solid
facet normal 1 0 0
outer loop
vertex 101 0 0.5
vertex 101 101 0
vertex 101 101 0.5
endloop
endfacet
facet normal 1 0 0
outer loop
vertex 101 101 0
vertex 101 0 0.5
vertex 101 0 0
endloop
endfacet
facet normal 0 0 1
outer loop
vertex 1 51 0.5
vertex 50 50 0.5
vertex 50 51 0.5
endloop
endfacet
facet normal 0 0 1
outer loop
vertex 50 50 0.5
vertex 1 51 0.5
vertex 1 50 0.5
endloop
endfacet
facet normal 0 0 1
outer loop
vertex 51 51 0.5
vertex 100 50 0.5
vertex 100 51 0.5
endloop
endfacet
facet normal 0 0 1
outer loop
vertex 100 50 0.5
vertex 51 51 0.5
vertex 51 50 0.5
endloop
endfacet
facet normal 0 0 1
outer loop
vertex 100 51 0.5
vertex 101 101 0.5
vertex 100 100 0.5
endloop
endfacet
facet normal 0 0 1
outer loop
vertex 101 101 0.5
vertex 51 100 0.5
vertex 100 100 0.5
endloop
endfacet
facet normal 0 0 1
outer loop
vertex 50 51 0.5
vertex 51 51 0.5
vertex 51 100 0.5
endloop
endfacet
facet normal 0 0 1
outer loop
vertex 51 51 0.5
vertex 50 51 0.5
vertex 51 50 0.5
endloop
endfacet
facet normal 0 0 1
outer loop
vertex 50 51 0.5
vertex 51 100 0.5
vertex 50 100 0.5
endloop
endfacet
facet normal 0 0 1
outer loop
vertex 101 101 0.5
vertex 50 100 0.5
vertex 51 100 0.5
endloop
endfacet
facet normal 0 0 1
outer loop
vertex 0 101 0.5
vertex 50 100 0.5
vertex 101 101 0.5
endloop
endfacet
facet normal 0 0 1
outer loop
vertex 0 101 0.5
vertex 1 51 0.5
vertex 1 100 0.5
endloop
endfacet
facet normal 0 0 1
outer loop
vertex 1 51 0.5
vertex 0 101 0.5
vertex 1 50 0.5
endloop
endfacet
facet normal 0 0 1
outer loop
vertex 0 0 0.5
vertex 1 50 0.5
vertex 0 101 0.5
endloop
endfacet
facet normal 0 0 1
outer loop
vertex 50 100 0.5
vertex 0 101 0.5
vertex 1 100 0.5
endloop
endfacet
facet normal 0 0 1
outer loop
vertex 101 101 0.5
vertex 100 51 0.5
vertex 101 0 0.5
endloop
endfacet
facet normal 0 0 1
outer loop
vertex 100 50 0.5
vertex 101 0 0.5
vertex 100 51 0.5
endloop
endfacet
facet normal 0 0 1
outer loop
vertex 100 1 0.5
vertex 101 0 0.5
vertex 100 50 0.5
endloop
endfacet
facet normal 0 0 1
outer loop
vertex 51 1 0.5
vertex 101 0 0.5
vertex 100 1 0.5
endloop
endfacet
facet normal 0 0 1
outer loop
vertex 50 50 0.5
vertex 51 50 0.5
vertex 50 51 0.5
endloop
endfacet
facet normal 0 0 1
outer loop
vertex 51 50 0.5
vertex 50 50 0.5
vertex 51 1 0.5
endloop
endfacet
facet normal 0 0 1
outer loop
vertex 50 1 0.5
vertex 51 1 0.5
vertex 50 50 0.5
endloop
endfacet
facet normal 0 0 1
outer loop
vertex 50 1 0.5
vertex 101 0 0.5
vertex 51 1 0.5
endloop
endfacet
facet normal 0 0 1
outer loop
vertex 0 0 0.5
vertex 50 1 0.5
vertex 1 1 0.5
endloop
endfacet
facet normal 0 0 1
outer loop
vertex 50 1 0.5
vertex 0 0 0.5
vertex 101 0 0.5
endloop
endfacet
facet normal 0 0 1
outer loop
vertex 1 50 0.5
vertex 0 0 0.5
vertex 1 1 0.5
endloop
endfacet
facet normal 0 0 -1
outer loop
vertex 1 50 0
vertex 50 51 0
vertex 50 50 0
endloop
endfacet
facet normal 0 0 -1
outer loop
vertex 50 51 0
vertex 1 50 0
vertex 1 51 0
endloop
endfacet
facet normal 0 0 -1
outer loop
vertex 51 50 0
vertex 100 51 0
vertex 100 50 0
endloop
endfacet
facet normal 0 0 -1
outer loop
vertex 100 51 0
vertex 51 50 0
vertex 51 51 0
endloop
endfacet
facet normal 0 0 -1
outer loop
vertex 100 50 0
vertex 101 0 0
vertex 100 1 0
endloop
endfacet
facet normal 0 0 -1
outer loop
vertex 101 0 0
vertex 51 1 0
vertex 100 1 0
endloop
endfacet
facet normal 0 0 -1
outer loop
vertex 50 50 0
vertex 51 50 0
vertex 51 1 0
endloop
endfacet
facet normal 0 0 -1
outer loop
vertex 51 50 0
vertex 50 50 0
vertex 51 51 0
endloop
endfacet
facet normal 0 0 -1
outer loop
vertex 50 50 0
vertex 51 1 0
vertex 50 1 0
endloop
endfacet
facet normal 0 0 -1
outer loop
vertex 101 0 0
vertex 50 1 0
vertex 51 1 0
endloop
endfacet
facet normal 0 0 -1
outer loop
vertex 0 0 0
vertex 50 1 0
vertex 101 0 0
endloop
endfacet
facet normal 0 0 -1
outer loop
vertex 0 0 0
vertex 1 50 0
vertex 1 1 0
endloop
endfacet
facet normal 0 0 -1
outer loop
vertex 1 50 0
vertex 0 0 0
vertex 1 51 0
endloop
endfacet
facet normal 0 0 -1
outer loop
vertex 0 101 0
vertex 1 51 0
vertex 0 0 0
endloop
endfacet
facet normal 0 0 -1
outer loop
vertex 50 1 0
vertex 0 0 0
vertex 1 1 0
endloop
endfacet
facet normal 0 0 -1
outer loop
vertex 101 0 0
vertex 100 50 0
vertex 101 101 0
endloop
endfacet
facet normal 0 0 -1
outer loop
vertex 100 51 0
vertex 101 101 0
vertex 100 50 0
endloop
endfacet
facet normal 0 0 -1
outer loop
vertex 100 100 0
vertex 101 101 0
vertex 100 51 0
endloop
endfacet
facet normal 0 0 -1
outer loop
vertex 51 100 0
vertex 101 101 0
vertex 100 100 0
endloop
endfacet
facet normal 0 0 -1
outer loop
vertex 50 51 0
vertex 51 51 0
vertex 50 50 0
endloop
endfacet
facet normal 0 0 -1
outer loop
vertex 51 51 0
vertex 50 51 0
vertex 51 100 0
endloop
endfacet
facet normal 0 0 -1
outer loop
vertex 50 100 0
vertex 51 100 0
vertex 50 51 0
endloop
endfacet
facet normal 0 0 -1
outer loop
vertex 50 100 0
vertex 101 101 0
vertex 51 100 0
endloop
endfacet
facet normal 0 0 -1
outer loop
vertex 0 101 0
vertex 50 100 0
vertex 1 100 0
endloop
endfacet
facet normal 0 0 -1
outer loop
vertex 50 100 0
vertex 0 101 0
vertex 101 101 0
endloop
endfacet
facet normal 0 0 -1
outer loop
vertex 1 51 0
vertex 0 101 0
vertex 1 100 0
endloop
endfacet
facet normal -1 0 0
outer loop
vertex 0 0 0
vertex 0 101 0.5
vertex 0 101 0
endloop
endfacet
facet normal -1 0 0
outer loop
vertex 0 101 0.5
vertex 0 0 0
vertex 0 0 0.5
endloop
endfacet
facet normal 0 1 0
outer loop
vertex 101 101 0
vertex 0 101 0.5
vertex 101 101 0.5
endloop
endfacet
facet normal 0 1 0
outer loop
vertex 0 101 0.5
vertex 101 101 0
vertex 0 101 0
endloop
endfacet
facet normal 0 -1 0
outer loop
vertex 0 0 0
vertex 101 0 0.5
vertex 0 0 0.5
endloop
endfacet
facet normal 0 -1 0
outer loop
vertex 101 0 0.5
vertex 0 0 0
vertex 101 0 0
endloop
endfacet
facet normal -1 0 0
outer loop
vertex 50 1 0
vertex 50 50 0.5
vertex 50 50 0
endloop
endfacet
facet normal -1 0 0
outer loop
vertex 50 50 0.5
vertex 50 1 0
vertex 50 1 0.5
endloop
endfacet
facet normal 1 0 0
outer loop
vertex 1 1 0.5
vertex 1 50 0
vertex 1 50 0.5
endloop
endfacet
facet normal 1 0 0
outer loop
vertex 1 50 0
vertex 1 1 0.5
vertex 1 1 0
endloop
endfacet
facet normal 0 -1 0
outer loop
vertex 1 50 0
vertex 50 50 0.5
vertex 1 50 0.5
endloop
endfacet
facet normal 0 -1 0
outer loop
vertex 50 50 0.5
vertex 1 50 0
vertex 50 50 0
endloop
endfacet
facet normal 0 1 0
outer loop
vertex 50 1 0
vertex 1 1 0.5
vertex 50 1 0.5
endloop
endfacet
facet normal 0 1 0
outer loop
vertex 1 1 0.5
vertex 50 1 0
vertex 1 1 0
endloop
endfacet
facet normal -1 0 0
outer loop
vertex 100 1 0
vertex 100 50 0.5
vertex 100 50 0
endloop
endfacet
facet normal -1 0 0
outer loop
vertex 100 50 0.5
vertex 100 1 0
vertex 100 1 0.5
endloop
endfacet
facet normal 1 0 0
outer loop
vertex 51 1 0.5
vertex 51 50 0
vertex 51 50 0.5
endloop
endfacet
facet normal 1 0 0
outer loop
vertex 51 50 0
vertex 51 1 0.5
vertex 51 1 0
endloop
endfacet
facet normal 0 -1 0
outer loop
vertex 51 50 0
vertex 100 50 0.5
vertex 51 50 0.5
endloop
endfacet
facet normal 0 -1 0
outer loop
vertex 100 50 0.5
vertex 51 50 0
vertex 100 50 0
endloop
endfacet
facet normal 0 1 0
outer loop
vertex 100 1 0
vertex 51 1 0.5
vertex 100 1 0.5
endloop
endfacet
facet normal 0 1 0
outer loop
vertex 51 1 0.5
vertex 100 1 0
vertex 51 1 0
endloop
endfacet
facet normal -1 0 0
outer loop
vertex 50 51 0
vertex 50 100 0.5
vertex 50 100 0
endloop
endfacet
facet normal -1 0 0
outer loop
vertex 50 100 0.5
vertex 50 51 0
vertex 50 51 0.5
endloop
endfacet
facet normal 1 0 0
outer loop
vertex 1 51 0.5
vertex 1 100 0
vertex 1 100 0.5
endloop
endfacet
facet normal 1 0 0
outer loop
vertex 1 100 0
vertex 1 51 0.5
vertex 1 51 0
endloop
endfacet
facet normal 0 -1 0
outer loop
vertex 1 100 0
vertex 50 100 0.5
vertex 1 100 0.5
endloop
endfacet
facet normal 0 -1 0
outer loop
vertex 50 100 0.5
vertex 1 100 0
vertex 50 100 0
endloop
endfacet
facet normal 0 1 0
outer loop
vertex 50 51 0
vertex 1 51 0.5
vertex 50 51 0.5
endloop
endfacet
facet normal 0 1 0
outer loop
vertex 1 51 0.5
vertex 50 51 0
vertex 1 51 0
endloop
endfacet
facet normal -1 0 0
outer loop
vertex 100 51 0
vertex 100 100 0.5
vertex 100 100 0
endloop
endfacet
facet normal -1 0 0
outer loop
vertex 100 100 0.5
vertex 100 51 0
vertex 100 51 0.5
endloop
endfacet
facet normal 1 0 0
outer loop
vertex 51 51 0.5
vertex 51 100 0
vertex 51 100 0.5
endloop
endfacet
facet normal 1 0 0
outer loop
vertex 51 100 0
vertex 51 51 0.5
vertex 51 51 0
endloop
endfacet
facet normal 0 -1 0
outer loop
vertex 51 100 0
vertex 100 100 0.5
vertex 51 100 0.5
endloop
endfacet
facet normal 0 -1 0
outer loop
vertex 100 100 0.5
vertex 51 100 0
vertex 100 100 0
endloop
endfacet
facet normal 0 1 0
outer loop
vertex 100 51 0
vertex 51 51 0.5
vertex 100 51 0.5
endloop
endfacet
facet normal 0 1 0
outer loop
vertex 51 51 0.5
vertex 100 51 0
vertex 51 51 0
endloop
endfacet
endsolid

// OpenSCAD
s = 100;
w = 1;
h = 0.5;

inside_dims = [s/2 - w, s/2 - w, h];

difference() {
    cube([s+w, s+w, h]);
    translate([w, w, 0])
        cube(inside_dims);
    translate([s/2 + w, w, 0])
        cube(inside_dims);
    translate([w, s/2 + w, 0])
        cube(inside_dims);
    translate([s/2 + w, s/2 + w, 0])
        cube(inside_dims);
}
